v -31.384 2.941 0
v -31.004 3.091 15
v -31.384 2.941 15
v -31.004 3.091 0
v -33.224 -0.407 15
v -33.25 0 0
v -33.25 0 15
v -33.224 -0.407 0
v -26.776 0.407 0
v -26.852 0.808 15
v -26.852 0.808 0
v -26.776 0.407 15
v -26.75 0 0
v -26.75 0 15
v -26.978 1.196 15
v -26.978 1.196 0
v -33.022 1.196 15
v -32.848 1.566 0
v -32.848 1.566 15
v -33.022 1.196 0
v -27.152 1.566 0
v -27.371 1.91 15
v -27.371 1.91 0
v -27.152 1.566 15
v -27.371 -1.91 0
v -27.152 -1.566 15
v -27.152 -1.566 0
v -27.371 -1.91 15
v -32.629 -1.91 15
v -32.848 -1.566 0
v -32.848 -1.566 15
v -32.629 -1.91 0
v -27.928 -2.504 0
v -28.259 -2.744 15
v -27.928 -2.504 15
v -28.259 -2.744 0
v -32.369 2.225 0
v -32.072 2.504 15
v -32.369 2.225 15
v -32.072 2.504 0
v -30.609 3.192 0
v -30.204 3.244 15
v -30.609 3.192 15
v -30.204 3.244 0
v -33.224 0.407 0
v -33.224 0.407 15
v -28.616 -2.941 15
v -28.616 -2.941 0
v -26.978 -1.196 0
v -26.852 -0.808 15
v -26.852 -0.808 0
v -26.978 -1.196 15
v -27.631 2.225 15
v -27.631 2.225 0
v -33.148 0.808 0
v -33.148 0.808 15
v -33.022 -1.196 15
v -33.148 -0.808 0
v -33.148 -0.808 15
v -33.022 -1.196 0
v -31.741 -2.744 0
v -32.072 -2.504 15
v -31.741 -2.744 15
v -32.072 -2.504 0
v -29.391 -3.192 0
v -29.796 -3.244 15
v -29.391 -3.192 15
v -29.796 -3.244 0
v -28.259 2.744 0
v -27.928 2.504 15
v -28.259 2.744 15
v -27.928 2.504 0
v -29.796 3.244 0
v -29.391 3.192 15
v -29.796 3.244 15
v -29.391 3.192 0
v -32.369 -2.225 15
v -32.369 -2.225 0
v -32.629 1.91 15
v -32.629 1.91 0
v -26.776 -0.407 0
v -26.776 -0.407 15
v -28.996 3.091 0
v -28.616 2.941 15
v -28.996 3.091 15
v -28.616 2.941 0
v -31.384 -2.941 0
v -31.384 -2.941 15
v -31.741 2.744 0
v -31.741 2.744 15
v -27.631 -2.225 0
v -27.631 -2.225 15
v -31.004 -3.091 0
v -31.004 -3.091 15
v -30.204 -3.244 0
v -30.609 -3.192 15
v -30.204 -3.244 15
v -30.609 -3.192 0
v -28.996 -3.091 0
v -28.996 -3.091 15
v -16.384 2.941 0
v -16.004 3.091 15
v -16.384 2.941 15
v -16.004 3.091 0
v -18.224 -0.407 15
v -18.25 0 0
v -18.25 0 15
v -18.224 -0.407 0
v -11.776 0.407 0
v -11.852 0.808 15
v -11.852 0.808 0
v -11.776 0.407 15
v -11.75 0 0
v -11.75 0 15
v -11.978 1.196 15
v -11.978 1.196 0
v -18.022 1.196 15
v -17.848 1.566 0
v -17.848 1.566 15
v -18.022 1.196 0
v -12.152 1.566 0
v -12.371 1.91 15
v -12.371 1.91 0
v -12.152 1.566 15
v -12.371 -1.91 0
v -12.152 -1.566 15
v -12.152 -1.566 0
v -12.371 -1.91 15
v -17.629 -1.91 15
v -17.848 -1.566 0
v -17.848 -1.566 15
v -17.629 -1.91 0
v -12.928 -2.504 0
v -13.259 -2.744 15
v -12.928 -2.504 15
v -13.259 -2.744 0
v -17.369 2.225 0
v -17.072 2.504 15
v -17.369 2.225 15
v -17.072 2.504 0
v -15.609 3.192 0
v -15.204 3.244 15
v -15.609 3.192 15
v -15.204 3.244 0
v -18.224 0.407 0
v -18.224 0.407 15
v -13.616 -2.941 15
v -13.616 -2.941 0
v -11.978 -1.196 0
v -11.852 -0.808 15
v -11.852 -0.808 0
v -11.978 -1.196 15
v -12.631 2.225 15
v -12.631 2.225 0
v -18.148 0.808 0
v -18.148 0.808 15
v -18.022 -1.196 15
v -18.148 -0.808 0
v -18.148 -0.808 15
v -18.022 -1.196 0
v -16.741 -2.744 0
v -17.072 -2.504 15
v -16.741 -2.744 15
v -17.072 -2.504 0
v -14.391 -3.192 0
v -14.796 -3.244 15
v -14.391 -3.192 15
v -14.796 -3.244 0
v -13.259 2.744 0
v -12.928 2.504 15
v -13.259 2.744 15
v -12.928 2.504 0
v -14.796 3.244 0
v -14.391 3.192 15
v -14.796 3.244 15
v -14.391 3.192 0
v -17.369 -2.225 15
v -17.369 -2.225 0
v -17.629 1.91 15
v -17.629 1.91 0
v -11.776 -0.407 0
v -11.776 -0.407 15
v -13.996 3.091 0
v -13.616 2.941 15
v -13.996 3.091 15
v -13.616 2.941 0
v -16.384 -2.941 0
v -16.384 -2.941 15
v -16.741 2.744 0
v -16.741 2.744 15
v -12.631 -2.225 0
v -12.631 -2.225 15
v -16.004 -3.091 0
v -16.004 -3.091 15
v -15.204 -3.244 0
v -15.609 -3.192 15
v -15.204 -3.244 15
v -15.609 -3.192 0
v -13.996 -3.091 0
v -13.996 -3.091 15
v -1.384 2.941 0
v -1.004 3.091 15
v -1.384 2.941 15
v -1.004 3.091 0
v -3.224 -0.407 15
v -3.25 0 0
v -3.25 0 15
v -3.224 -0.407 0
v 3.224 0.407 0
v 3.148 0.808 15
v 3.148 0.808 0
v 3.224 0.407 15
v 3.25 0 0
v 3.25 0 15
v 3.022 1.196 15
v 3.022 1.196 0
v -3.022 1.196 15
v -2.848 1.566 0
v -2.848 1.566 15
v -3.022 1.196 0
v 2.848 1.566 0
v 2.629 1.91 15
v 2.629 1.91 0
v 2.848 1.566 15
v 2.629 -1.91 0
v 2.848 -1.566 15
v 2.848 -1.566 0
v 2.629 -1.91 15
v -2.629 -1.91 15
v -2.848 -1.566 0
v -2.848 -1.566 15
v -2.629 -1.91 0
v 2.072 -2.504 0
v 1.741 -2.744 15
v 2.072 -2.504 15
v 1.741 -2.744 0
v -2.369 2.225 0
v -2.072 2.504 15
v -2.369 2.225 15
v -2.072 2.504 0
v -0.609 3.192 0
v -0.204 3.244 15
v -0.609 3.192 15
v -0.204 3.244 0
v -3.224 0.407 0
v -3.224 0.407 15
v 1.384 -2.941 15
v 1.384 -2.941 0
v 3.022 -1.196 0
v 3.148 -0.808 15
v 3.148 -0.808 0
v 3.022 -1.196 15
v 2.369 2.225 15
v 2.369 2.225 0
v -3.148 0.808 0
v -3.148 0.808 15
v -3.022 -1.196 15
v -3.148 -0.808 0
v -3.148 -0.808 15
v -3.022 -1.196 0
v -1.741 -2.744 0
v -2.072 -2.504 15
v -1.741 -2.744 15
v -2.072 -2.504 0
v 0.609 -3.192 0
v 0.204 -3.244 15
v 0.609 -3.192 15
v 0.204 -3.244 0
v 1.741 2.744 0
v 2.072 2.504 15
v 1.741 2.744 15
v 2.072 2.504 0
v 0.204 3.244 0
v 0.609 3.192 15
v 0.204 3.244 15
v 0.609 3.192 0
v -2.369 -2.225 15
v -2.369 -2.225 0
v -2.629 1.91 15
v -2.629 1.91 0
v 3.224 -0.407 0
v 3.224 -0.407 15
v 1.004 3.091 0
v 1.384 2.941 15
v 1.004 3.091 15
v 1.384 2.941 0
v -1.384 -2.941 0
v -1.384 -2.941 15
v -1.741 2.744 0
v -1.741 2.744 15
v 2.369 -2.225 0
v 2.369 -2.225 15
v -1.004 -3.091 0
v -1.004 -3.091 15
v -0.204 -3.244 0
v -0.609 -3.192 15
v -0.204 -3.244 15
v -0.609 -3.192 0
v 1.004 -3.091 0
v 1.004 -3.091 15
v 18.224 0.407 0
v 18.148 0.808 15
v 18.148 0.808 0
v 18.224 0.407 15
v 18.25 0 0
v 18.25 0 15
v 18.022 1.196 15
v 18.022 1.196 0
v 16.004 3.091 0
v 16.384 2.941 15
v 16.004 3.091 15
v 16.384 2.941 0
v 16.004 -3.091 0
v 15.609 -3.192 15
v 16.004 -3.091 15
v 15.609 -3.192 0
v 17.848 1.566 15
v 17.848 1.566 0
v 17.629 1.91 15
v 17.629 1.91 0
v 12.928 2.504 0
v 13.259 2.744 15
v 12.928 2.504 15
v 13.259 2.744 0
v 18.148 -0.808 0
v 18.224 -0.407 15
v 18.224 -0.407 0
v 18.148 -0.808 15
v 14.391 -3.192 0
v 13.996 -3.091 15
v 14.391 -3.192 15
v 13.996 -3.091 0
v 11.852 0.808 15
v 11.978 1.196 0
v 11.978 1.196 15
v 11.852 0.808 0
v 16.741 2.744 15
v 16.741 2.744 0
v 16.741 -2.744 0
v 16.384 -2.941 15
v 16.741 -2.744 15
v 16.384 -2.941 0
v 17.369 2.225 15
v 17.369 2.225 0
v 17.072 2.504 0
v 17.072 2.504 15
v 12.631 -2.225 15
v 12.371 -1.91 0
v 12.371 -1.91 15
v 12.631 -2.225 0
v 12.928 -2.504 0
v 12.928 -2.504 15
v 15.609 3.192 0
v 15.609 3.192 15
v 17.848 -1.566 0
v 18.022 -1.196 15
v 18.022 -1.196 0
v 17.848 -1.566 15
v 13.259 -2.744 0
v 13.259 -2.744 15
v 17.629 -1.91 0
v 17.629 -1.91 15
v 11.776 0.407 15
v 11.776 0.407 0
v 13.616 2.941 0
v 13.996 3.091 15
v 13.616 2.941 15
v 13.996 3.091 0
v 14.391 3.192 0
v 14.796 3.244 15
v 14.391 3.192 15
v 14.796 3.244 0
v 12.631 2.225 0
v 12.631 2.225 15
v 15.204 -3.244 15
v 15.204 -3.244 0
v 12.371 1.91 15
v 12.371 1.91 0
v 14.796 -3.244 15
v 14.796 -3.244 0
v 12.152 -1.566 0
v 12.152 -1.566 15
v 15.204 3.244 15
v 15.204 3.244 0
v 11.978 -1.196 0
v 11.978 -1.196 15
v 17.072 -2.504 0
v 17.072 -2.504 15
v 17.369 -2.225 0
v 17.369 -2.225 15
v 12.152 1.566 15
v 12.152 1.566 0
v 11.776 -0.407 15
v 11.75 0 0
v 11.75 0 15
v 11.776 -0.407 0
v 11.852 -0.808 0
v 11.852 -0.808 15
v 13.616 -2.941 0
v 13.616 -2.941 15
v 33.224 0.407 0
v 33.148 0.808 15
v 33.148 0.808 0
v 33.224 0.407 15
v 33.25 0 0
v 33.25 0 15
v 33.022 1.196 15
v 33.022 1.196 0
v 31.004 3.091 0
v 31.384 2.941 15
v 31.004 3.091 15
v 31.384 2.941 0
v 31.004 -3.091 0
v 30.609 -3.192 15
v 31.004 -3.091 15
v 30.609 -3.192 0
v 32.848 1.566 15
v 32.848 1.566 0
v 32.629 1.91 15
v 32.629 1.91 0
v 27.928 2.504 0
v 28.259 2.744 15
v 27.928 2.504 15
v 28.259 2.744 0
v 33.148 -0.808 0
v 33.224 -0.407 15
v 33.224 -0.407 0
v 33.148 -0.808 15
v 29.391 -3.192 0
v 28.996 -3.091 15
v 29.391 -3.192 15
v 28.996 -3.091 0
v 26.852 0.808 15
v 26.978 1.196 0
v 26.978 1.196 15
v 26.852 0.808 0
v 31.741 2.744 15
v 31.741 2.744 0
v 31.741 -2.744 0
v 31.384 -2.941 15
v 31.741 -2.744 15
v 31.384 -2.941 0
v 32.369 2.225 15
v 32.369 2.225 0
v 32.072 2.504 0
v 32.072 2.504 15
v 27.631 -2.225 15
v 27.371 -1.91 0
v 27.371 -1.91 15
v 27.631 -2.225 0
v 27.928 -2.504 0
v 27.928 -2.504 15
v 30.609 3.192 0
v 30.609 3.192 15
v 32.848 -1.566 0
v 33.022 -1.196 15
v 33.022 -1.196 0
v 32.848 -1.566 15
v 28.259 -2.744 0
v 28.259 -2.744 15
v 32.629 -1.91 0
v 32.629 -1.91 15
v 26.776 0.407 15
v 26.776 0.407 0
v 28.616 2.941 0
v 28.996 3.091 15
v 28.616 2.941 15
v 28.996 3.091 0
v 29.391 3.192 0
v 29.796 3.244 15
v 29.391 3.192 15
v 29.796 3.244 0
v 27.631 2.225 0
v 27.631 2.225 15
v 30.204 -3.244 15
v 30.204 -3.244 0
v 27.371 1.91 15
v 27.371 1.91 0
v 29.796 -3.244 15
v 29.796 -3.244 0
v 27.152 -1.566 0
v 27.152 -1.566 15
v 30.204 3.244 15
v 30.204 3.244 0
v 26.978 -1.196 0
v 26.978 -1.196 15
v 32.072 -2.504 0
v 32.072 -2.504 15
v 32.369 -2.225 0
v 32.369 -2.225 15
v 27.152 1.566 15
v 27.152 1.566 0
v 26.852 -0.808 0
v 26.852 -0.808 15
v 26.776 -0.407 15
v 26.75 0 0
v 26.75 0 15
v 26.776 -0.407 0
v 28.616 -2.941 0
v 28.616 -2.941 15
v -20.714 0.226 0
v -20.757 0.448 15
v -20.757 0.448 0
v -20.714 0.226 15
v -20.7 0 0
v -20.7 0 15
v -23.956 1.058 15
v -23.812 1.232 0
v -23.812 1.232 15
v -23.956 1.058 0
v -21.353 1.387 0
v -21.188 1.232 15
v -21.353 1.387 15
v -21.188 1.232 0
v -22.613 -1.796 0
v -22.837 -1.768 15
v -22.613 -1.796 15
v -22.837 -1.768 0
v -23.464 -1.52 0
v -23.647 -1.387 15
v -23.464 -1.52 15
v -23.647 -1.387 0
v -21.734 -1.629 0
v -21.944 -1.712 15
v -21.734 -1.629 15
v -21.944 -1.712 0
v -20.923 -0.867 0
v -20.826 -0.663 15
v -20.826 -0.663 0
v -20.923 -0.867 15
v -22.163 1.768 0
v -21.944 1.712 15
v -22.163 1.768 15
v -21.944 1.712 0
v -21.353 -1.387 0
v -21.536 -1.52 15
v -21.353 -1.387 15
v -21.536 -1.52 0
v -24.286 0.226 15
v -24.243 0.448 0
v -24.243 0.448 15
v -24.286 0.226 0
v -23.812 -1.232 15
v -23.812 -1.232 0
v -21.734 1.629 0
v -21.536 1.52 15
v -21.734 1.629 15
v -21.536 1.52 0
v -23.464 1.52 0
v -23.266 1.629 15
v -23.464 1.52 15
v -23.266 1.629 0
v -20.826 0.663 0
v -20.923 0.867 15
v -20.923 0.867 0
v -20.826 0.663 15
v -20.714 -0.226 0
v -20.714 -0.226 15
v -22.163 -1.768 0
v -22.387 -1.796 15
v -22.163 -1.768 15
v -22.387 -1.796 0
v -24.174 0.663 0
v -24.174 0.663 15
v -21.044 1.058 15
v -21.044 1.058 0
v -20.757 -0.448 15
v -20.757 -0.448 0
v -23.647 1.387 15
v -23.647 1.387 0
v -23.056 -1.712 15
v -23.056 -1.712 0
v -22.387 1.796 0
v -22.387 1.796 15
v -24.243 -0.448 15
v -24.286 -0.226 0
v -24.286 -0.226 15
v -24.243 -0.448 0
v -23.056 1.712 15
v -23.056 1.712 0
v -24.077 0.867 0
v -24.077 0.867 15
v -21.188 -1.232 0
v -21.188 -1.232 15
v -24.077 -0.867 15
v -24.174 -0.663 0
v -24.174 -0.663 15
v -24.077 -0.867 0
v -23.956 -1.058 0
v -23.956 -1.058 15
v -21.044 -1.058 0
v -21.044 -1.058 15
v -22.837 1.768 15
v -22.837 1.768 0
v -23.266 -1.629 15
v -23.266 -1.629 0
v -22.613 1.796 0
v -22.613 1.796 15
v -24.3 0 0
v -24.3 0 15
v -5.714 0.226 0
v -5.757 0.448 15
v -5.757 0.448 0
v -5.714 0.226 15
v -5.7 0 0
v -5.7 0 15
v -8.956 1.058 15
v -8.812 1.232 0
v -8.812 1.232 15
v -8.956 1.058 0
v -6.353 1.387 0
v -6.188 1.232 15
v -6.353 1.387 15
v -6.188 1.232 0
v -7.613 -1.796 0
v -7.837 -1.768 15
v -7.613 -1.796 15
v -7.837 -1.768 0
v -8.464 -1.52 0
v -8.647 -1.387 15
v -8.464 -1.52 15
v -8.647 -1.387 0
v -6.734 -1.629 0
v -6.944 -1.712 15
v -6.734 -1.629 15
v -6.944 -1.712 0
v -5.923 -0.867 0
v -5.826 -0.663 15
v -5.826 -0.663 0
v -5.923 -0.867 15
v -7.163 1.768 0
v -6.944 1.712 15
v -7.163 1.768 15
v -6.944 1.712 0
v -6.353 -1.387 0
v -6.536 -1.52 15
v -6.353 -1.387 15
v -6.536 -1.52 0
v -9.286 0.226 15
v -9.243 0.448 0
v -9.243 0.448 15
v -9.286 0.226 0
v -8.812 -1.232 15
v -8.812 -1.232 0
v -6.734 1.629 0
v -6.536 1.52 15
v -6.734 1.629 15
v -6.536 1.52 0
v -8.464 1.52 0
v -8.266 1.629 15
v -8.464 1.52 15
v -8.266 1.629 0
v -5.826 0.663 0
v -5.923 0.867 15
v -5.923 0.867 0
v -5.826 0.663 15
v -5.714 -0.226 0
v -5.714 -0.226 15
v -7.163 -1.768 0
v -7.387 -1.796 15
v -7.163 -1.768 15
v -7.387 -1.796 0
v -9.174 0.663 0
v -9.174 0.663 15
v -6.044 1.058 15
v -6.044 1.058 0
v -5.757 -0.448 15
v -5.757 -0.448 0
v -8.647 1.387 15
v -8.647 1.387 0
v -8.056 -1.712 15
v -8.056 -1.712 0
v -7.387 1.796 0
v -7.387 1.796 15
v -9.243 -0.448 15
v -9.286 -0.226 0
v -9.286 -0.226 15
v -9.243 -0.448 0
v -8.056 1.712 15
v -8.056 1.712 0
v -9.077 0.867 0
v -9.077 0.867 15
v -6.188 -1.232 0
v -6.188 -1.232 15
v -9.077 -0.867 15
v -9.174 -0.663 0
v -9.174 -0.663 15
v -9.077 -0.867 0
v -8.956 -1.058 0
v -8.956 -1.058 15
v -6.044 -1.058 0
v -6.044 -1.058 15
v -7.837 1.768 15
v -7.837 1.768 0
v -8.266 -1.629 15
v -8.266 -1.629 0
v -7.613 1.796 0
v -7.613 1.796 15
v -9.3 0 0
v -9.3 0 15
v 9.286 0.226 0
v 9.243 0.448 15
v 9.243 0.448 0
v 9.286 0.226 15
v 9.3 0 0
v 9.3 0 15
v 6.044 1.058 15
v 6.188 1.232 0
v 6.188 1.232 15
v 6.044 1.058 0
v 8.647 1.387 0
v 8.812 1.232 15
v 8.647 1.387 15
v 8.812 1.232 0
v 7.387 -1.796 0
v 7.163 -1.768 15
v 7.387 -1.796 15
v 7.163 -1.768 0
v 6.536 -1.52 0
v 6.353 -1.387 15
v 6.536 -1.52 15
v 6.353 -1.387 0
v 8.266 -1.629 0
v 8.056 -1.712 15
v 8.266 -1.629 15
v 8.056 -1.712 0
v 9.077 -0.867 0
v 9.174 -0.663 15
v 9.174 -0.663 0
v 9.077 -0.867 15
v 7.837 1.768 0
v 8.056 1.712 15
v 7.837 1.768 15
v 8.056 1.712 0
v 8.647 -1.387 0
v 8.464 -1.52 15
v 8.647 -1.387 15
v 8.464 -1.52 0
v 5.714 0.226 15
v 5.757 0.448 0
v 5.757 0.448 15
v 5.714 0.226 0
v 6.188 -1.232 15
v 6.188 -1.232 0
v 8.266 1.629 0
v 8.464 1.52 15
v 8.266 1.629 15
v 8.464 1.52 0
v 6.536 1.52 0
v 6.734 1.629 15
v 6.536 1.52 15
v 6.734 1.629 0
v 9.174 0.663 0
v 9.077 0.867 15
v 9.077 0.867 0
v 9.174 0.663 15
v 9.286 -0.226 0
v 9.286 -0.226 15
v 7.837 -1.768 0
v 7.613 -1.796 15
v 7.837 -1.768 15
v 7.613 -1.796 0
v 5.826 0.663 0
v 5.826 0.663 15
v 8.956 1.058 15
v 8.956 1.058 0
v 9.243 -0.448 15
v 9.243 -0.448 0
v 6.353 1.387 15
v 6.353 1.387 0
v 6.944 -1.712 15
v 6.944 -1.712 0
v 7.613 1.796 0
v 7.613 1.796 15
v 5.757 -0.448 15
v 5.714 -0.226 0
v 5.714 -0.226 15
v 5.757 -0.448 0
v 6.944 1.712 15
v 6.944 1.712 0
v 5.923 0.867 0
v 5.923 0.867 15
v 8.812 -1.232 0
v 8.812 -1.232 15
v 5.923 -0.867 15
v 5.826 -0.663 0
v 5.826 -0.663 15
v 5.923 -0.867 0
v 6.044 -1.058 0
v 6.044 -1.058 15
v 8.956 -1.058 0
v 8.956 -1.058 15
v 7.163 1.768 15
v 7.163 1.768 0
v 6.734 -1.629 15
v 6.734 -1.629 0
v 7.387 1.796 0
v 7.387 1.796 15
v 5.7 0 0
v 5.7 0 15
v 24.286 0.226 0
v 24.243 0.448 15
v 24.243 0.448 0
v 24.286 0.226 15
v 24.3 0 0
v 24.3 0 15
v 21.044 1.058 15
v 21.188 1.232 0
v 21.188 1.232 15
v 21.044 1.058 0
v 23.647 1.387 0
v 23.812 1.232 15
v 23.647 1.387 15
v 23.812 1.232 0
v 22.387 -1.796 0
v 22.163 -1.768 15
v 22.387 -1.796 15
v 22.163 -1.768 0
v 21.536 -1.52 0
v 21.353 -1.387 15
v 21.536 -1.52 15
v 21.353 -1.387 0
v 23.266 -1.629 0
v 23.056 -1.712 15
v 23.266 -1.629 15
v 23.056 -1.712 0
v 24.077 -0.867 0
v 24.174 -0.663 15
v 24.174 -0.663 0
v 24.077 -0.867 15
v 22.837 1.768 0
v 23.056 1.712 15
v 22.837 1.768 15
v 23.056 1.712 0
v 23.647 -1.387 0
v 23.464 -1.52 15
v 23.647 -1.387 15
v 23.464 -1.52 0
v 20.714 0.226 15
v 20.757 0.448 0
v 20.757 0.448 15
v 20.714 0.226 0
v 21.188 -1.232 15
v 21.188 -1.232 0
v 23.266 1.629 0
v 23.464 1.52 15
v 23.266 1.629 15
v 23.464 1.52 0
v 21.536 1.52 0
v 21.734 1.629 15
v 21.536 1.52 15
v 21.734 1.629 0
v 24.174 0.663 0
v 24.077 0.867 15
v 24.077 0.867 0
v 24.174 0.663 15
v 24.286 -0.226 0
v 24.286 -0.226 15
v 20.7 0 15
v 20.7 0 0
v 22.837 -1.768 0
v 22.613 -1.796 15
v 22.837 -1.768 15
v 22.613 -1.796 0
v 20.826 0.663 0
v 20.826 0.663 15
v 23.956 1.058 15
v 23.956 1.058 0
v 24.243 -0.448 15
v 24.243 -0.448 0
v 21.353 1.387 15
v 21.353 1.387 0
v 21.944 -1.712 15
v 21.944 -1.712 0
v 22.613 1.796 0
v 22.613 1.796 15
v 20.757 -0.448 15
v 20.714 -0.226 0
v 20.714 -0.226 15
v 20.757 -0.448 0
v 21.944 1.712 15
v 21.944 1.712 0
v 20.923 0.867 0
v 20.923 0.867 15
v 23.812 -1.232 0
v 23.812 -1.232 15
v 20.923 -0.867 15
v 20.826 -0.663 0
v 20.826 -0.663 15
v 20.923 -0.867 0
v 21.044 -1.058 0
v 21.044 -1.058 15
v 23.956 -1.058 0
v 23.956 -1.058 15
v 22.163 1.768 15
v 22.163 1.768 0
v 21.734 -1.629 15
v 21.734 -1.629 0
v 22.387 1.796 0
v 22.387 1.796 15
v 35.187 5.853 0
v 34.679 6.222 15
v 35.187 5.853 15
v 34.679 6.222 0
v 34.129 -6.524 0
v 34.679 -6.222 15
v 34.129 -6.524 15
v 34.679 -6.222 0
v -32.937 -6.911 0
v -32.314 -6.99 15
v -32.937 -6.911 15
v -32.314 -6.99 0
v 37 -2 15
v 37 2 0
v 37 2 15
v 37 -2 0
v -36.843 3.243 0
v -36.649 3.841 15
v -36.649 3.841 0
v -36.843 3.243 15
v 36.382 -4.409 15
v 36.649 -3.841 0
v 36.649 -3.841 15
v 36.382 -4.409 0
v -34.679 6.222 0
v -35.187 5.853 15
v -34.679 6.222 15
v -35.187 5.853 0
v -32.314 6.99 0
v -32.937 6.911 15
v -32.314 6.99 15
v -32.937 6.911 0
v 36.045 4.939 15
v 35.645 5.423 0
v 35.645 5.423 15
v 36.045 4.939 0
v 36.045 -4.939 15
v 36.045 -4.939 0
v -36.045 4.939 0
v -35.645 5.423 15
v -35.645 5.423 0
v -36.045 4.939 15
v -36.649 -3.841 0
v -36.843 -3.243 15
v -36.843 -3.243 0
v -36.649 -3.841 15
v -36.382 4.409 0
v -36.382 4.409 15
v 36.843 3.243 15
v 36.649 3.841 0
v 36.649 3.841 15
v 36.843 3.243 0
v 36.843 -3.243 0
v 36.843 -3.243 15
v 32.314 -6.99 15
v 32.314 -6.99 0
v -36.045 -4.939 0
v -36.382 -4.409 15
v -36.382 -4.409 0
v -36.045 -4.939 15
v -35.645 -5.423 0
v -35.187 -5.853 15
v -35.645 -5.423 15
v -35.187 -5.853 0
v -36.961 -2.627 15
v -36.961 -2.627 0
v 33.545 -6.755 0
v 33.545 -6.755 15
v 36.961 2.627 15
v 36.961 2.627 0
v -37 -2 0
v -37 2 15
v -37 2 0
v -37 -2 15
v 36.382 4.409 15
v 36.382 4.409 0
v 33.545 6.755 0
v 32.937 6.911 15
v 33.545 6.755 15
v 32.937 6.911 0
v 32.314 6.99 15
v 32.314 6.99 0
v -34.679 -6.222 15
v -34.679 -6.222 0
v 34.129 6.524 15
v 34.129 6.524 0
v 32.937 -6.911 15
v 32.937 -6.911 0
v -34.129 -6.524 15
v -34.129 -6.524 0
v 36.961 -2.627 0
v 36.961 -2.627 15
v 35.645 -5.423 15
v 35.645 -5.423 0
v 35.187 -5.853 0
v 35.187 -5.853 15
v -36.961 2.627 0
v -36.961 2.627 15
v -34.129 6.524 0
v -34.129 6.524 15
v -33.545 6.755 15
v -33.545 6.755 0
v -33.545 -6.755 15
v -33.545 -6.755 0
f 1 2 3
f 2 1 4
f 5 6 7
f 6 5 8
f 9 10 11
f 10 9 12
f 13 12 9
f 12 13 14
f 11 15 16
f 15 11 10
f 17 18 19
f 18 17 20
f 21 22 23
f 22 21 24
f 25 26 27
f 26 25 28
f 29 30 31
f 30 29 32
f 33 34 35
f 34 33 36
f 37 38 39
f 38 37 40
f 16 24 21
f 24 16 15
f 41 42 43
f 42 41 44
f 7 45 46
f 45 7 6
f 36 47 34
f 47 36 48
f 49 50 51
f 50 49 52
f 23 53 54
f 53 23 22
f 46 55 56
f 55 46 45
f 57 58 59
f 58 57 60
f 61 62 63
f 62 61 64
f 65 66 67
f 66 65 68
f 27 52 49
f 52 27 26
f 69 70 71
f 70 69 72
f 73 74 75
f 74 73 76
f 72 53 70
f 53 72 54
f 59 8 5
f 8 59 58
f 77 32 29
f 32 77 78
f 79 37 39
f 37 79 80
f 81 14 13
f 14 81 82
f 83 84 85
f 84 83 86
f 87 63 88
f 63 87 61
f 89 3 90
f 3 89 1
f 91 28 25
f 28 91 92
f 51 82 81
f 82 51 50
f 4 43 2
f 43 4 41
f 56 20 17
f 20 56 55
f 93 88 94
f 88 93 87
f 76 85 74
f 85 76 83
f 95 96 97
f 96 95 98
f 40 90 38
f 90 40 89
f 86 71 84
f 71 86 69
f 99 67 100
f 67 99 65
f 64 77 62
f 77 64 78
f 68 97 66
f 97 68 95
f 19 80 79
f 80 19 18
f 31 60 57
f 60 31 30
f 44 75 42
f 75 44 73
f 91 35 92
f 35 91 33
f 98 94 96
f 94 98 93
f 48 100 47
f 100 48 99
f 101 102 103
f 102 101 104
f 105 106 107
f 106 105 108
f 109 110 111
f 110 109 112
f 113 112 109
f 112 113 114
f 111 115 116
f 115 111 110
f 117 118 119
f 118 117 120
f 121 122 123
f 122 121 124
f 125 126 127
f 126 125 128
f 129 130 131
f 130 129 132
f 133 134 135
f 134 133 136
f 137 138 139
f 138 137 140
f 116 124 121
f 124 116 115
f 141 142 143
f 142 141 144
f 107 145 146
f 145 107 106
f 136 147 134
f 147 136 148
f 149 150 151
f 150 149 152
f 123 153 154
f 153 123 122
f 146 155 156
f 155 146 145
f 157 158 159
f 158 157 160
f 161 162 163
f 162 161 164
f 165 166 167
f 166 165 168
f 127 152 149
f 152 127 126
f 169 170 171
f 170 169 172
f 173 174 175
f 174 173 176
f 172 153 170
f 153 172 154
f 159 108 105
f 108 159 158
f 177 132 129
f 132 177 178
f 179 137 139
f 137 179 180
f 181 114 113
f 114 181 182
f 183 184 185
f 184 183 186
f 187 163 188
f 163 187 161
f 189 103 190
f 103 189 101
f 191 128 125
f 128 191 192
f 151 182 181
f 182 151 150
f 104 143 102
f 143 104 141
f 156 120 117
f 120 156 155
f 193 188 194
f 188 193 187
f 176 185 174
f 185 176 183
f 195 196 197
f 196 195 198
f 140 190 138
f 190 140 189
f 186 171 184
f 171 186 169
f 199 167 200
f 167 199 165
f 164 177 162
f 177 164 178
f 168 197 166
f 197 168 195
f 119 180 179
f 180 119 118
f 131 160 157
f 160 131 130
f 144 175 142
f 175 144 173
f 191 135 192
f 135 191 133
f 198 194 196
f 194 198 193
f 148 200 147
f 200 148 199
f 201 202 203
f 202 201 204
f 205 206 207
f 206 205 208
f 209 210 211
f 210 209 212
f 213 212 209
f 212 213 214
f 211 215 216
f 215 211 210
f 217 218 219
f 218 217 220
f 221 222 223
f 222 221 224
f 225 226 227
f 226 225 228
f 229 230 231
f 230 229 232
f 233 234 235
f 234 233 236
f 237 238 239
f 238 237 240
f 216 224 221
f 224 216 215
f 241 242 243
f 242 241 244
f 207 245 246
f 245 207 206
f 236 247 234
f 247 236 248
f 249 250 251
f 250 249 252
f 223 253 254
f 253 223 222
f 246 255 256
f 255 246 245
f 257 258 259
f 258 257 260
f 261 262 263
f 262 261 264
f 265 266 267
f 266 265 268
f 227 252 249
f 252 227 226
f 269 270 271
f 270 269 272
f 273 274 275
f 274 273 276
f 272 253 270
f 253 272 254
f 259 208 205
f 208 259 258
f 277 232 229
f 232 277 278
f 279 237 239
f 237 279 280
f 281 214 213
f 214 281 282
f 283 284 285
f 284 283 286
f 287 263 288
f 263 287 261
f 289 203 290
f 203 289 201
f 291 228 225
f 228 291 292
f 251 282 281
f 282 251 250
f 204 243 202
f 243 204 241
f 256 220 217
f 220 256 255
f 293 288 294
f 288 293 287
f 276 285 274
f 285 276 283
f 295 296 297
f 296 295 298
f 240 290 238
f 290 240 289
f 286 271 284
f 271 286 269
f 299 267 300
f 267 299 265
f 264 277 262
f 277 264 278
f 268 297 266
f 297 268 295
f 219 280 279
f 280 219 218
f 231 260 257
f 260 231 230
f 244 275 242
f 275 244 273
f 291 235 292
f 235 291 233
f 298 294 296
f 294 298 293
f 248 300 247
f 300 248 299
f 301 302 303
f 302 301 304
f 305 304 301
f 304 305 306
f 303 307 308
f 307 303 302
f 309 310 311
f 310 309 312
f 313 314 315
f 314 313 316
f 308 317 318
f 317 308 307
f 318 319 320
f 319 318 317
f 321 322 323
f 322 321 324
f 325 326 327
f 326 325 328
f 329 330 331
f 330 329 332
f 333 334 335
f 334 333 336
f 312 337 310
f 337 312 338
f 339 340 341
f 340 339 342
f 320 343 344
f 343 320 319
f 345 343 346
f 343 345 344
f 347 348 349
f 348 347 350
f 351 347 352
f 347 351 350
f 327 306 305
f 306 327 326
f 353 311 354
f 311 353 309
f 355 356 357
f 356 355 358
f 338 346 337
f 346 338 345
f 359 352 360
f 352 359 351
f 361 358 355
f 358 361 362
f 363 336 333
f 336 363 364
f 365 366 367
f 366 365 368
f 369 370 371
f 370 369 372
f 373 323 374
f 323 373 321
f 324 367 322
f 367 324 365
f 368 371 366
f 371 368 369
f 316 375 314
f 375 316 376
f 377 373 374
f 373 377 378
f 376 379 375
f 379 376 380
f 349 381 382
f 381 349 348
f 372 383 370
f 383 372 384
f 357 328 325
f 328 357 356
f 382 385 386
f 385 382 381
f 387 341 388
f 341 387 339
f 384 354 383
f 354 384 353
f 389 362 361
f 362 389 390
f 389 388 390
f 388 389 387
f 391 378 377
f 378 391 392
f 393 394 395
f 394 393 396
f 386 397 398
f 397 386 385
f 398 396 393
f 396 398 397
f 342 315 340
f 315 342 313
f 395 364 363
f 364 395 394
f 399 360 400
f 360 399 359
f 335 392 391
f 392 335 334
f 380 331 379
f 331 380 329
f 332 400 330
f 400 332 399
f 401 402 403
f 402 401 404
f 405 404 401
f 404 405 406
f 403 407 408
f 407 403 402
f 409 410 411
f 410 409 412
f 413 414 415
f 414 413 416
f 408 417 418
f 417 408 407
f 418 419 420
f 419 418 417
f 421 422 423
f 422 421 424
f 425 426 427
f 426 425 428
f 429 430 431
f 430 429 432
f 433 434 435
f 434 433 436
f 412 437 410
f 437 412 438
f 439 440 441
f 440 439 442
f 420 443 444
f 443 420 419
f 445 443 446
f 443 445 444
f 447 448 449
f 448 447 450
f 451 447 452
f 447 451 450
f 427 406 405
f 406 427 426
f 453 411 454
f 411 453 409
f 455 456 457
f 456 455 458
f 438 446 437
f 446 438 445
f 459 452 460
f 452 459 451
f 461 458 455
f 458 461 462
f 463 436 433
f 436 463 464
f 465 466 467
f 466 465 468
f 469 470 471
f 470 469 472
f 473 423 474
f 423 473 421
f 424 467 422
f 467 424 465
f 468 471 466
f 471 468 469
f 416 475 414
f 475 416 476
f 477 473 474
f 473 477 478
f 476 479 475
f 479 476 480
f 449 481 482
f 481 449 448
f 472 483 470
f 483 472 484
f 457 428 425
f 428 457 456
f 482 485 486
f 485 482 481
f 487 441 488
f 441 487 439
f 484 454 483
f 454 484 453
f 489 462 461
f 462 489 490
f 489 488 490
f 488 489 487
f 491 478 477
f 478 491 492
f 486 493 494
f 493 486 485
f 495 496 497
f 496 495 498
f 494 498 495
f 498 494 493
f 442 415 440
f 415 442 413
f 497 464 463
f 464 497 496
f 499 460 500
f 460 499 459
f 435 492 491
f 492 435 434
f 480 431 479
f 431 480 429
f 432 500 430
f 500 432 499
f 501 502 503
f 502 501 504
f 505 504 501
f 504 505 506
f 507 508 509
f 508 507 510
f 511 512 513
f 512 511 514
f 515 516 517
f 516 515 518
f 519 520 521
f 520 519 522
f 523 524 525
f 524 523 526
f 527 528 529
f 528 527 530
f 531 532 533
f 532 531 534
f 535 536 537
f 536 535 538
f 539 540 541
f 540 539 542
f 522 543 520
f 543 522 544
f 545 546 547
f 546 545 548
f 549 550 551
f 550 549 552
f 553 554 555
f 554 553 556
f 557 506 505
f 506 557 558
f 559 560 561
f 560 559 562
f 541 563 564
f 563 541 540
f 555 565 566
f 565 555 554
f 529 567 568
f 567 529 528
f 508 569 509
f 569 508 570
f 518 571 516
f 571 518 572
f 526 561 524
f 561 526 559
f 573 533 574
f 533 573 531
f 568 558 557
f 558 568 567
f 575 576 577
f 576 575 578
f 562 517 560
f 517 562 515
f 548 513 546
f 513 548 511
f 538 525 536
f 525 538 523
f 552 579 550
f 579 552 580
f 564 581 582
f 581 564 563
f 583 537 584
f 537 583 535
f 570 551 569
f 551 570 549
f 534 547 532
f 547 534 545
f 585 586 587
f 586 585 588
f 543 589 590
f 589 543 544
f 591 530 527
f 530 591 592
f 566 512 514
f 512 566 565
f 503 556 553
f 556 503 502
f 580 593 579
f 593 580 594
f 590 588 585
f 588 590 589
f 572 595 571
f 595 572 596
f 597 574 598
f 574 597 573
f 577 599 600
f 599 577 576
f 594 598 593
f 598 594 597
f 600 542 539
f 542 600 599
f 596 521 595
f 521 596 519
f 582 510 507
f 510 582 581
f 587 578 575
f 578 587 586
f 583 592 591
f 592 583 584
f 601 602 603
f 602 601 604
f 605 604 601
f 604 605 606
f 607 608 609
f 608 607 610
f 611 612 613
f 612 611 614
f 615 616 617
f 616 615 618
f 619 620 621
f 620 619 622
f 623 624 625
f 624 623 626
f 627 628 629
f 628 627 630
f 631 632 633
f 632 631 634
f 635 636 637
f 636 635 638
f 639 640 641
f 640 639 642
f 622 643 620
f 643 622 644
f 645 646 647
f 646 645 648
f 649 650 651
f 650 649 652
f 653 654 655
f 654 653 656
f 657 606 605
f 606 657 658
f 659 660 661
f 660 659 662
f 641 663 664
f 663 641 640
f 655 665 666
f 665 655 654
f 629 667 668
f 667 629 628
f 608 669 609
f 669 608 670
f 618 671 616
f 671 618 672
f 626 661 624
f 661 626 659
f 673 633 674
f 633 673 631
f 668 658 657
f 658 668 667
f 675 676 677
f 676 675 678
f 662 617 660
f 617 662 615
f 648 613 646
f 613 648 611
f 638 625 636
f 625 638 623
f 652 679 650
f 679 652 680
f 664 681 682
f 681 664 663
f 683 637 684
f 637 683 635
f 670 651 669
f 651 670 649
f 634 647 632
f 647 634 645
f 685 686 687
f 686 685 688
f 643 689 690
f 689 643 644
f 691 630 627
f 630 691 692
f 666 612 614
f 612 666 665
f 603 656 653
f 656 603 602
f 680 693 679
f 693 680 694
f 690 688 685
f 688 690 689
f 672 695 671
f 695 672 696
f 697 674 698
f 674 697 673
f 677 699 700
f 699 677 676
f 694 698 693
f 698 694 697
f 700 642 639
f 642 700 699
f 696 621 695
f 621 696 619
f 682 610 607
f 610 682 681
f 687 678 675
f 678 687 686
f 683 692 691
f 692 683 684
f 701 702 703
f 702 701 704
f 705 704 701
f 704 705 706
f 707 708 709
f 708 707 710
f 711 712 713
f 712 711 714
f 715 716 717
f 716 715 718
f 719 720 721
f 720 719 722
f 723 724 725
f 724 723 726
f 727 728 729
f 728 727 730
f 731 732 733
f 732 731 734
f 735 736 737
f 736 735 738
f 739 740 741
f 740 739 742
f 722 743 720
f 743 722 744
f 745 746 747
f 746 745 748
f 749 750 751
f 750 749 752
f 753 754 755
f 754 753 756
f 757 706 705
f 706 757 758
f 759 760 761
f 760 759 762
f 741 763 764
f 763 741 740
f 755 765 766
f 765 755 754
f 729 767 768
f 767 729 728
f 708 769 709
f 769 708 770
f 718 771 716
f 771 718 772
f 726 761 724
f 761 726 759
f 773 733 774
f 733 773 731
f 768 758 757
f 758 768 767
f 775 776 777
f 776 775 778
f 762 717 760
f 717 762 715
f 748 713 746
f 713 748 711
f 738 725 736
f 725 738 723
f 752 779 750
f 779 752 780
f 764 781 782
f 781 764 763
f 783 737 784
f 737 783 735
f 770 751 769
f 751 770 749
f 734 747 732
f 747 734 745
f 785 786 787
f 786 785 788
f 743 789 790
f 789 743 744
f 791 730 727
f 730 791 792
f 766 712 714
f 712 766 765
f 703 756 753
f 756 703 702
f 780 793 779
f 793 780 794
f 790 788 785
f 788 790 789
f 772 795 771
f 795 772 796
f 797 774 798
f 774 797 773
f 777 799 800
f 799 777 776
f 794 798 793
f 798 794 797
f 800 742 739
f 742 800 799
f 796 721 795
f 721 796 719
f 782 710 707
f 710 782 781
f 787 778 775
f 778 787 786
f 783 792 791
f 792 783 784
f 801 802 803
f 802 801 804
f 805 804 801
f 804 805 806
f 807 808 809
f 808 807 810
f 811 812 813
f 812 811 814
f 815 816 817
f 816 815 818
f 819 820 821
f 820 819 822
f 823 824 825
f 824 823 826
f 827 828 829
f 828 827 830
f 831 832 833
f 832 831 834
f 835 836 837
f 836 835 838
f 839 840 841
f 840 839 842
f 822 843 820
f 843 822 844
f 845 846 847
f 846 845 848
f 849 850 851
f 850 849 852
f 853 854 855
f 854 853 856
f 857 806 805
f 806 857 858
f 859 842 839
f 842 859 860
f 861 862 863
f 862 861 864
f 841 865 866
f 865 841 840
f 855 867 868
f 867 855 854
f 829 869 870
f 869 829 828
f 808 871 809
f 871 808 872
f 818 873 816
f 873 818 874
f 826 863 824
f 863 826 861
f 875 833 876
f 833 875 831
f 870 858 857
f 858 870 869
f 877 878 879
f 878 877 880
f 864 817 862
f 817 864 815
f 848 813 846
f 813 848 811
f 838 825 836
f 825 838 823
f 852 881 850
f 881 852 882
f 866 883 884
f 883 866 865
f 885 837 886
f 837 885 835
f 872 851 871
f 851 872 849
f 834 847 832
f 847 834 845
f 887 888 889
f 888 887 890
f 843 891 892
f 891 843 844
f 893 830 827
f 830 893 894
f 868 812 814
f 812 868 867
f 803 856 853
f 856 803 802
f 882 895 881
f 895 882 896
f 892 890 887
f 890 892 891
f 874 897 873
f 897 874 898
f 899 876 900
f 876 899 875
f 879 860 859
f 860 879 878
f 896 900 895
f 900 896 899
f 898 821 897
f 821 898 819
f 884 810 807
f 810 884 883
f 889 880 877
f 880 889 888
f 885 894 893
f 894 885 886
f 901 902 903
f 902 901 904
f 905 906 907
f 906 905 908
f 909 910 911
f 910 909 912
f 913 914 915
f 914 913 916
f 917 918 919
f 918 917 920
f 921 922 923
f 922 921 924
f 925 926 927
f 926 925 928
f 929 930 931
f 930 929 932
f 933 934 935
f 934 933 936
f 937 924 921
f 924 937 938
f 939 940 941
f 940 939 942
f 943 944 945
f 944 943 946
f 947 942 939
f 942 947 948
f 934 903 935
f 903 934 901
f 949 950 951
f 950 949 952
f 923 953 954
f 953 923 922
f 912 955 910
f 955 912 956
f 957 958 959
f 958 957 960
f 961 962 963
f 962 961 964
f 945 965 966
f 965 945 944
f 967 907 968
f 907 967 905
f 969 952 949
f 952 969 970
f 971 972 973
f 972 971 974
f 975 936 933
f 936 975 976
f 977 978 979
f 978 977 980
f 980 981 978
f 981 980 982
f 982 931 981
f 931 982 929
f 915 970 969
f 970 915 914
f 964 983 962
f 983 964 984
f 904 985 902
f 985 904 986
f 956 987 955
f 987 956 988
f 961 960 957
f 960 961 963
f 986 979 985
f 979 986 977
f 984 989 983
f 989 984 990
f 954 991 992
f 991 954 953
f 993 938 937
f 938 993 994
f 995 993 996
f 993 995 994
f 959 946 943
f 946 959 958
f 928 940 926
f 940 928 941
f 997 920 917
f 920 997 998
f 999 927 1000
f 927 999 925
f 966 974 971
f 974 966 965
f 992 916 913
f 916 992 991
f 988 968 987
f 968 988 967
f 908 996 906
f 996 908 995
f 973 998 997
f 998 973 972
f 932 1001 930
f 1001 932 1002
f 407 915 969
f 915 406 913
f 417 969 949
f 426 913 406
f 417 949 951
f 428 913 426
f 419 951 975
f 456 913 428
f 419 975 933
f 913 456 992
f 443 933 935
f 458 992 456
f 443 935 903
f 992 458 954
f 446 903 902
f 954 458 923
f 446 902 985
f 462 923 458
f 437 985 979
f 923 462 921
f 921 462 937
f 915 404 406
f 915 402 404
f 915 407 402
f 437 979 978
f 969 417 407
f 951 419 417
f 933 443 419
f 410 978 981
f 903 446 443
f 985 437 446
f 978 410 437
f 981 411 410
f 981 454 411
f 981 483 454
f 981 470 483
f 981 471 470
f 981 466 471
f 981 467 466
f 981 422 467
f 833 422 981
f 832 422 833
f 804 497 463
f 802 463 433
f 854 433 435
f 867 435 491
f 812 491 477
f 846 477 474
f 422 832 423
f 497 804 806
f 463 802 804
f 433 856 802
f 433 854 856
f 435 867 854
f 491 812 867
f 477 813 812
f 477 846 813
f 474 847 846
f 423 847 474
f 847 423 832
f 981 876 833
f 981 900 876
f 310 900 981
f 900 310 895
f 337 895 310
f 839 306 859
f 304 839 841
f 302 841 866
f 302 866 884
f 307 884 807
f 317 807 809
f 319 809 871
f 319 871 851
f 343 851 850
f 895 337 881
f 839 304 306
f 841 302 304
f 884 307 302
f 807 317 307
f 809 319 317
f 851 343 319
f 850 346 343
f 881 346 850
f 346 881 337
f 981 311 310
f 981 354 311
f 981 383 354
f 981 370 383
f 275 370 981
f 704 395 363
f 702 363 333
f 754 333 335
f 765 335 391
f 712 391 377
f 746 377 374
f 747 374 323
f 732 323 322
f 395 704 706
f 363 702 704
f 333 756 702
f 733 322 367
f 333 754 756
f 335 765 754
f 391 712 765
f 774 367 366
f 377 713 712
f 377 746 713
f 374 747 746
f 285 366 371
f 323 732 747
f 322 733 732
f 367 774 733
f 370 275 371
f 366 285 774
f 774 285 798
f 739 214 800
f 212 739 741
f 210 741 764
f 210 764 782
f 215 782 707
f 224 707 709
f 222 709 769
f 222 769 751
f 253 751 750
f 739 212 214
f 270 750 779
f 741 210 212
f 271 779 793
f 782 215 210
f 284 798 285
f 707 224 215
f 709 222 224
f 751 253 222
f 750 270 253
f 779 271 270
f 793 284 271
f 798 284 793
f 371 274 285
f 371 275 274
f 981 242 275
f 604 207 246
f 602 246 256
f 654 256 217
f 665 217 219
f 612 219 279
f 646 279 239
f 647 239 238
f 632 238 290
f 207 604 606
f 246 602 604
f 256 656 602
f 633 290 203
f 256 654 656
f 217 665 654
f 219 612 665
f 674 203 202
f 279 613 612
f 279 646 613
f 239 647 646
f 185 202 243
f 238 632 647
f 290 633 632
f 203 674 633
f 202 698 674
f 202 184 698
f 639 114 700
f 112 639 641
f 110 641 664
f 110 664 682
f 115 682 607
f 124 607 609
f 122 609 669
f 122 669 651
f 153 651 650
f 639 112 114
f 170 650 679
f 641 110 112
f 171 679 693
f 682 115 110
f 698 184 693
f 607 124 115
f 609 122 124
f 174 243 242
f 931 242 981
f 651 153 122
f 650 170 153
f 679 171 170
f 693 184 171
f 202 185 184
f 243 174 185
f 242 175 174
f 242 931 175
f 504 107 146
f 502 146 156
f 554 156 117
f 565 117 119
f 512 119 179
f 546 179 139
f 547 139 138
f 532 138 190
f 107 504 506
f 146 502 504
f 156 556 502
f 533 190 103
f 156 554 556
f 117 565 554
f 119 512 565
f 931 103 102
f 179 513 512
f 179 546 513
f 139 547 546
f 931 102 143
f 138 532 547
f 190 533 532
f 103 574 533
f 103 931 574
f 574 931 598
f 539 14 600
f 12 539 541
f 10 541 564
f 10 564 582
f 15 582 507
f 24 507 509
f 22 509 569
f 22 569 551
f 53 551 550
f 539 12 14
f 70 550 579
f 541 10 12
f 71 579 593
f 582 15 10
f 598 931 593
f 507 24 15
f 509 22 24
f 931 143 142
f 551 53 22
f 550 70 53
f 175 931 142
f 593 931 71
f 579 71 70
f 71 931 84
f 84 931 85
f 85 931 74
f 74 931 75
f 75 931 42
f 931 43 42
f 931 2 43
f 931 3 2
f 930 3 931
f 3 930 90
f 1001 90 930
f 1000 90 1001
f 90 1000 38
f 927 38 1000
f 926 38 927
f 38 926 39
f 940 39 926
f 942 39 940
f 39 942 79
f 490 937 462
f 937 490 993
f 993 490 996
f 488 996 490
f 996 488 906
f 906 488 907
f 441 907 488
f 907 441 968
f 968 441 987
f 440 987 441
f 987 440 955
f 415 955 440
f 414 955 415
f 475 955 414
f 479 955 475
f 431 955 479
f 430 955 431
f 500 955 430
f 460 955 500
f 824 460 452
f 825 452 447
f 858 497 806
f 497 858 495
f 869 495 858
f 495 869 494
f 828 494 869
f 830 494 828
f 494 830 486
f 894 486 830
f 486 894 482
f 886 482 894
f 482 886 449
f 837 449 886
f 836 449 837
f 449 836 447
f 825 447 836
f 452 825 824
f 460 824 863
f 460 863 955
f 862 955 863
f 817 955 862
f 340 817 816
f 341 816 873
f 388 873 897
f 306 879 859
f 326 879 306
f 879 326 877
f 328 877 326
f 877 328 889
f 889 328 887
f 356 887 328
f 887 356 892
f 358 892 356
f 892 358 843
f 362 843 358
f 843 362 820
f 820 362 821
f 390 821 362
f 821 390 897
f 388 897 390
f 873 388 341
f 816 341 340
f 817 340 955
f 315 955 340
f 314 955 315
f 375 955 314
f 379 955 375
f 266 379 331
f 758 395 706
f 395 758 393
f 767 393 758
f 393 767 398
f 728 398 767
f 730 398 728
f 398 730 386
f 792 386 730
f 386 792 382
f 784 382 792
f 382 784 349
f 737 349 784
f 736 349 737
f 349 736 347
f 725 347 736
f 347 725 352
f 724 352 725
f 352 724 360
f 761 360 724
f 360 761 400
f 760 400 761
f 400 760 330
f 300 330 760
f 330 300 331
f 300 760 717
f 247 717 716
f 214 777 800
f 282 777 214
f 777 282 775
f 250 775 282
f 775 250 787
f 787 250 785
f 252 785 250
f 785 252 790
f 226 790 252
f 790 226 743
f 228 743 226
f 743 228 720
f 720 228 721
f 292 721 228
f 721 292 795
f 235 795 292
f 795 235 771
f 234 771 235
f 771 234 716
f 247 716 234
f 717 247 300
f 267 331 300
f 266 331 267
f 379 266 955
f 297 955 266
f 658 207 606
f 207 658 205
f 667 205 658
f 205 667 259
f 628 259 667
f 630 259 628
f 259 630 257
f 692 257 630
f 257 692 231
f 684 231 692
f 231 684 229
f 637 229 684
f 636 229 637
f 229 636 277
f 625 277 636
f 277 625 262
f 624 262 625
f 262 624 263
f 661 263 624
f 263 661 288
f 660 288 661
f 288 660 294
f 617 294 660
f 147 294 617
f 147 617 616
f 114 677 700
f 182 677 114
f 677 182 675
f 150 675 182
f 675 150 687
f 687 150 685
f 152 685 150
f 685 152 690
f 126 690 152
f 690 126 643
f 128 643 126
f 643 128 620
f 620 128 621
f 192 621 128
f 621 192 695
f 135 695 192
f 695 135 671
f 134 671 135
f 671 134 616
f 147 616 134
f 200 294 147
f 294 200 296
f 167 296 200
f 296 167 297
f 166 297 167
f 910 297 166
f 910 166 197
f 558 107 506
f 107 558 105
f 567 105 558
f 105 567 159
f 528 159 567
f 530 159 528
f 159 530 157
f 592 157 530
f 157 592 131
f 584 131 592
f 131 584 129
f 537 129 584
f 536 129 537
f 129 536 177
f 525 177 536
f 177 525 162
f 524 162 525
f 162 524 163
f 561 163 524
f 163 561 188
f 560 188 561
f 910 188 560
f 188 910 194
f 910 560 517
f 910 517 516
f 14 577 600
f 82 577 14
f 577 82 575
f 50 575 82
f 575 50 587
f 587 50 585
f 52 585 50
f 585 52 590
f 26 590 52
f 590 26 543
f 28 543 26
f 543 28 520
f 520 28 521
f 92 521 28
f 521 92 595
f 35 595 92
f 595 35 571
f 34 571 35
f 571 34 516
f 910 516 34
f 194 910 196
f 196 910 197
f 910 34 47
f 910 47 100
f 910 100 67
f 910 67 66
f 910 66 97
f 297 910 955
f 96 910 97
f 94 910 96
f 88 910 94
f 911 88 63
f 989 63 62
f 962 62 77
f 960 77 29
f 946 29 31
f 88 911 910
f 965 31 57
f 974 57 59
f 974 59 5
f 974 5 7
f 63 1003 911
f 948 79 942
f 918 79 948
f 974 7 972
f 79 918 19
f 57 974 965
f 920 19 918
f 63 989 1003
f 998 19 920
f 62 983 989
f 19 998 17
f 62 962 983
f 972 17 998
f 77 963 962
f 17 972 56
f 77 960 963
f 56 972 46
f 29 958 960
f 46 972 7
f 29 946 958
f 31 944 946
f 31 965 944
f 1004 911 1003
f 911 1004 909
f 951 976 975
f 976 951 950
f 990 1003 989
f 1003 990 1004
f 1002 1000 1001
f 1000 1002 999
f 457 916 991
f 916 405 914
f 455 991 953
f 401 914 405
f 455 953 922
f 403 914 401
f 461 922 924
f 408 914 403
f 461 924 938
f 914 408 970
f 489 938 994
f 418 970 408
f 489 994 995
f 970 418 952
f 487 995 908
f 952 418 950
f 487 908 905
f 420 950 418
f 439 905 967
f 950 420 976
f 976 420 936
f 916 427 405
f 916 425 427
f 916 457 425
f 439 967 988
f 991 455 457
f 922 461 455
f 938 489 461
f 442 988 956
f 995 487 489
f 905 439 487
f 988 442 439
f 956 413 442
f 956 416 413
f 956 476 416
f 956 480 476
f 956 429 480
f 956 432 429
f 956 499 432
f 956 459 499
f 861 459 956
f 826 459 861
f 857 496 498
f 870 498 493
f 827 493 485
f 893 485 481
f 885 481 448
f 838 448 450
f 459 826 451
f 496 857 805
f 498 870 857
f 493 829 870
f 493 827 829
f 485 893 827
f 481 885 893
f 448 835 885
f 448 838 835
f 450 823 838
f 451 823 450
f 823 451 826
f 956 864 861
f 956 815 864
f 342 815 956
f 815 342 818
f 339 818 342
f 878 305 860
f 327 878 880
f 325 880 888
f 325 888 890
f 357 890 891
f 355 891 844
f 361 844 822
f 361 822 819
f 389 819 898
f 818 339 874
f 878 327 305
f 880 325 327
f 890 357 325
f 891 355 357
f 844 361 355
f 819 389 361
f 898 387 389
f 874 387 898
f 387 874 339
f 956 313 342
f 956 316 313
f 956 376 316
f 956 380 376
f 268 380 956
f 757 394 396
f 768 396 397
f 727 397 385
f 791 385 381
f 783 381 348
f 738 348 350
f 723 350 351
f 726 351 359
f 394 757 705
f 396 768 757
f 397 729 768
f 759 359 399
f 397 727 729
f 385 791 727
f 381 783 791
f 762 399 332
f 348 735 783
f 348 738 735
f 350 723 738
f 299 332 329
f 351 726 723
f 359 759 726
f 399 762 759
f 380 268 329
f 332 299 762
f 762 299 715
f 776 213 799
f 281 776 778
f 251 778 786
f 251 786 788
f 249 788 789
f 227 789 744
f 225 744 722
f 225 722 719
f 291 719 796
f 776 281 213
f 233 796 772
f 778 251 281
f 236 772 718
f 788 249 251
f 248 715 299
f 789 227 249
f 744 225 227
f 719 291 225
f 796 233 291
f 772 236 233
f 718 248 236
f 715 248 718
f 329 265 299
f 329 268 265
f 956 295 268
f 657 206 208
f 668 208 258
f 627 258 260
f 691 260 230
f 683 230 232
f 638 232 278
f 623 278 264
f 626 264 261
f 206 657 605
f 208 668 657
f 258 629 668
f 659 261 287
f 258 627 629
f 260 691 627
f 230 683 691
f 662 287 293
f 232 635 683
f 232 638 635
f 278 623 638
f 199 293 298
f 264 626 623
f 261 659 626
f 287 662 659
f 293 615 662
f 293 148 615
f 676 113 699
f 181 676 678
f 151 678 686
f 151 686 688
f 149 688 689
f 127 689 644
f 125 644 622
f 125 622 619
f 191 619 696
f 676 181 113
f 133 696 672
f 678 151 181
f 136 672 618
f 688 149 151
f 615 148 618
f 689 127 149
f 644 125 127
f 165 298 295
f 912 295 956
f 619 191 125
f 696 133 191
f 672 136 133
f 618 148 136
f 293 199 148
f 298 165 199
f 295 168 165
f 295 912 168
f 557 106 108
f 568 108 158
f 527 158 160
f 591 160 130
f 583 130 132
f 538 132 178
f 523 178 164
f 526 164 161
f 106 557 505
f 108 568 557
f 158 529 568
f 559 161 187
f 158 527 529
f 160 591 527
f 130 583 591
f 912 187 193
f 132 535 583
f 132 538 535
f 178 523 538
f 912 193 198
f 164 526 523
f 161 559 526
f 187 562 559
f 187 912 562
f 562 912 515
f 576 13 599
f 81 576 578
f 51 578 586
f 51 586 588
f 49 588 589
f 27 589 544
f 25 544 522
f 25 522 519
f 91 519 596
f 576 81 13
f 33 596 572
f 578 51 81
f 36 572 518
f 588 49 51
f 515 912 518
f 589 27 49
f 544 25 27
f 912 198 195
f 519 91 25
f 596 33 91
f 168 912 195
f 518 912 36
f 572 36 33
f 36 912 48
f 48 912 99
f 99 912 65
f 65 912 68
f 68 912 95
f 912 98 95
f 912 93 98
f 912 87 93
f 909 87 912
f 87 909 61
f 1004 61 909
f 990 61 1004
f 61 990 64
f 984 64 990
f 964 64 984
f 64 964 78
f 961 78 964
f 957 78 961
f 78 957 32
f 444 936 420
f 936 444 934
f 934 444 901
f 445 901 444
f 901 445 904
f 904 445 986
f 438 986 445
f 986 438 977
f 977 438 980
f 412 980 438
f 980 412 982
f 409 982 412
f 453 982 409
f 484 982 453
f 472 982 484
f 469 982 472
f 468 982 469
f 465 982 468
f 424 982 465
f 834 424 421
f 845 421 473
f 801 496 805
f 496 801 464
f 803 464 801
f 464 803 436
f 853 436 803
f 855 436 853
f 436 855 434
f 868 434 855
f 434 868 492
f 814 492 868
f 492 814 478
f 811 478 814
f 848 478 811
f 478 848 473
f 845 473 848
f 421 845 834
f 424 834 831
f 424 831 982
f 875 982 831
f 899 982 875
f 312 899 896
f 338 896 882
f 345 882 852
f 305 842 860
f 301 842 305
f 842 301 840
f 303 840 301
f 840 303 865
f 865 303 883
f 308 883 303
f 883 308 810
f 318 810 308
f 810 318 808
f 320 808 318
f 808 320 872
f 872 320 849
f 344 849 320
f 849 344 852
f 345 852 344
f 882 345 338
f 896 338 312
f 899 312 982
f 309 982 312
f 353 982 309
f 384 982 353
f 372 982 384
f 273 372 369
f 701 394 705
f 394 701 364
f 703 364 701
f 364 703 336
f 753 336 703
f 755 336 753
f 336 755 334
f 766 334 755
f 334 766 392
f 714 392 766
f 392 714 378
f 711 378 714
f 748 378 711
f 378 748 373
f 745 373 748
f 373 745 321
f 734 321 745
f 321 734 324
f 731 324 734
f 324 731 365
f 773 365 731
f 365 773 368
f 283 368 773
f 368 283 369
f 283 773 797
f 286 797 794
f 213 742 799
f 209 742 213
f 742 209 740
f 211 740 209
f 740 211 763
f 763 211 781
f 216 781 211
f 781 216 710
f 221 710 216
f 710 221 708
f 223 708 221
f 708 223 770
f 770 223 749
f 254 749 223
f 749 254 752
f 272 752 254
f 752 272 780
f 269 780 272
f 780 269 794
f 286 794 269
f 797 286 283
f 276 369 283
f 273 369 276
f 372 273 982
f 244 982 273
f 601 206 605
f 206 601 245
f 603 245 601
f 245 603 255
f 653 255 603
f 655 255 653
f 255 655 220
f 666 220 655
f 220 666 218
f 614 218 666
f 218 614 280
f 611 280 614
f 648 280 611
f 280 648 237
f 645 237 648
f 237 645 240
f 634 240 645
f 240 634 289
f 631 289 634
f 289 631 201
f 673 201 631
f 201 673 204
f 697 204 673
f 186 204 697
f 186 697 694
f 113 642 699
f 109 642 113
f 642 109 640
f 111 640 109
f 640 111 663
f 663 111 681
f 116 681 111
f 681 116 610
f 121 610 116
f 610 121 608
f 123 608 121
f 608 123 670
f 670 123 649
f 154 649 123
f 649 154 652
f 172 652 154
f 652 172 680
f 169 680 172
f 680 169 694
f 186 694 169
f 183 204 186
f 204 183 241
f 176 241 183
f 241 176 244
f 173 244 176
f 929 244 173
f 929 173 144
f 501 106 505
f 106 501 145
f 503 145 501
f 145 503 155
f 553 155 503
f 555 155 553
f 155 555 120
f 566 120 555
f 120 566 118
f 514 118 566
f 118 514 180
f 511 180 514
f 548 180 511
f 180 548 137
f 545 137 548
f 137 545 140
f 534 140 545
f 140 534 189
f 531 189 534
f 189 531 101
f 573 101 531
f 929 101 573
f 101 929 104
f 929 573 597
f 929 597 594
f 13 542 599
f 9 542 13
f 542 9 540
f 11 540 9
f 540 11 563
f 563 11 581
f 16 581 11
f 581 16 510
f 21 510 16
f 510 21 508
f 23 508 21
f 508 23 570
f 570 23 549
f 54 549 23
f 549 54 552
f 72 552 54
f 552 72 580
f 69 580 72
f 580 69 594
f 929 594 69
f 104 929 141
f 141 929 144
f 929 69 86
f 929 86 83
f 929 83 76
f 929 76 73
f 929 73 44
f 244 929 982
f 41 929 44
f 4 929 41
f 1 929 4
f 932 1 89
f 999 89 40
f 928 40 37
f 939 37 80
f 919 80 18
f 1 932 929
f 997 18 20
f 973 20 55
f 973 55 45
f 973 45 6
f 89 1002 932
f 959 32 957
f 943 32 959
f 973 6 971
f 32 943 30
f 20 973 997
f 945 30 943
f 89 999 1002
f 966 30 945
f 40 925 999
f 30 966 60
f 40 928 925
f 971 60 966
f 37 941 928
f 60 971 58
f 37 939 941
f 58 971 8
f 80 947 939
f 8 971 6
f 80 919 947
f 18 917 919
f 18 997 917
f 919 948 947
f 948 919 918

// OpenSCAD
$fn = 50;


difference() {
	union() {
		*color(alpha = 1.0000000000, c = "gray") {
			translate(v = [0, 7, 0]) {
				linear_extrude(height = 1) {
					text(font = "Arial:style=Bold", halign = "center", size = 4.5000000000, text = "COMMENT plate main", valign = "center");
				}
			}
		}
		hull() {
			translate(v = [-32.0000000000, 2.0000000000, 0]) {
				cylinder(h = 15, r = 5);
			}
			translate(v = [32.0000000000, 2.0000000000, 0]) {
				cylinder(h = 15, r = 5);
			}
			translate(v = [-32.0000000000, -2.0000000000, 0]) {
				cylinder(h = 15, r = 5);
			}
			translate(v = [32.0000000000, -2.0000000000, 0]) {
				cylinder(h = 15, r = 5);
			}
		}
	}
	union() {
		*color(alpha = 1.0000000000, c = "gray") {
			translate(v = [0, 7, 0]) {
				linear_extrude(height = 1) {
					text(font = "Arial:style=Bold", halign = "center", size = 4.5000000000, text = "COMMENT holes main", valign = "center");
				}
			}
		}
		translate(v = [-30.0000000000, 0.0000000000, 0]) {
			translate(v = [0, 0, -100]) {
				cylinder(h = 200, r = 3.2500000000);
			}
		}
		translate(v = [-15.0000000000, 0.0000000000, 0]) {
			translate(v = [0, 0, -100]) {
				cylinder(h = 200, r = 3.2500000000);
			}
		}
		translate(v = [0, 0, -100]) {
			cylinder(h = 200, r = 3.2500000000);
		}
		translate(v = [15.0000000000, 0.0000000000, 0]) {
			translate(v = [0, 0, -100]) {
				cylinder(h = 200, r = 3.2500000000);
			}
		}
		translate(v = [30.0000000000, 0.0000000000, 0]) {
			translate(v = [0, 0, -100]) {
				cylinder(h = 200, r = 3.2500000000);
			}
		}
		translate(v = [-30.0000000000, 0.0000000000, 0]) {
			translate(v = [0, 0, -100]) {
				cylinder(h = 200, r = 1.8000000000);
			}
		}
		translate(v = [-22.5000000000, 0.0000000000, 0]) {
			translate(v = [0, 0, -100]) {
				cylinder(h = 200, r = 1.8000000000);
			}
		}
		translate(v = [-15.0000000000, 0.0000000000, 0]) {
			translate(v = [0, 0, -100]) {
				cylinder(h = 200, r = 1.8000000000);
			}
		}
		translate(v = [-7.5000000000, 0.0000000000, 0]) {
			translate(v = [0, 0, -100]) {
				cylinder(h = 200, r = 1.8000000000);
			}
		}
		translate(v = [0, 0, -100]) {
			cylinder(h = 200, r = 1.8000000000);
		}
		translate(v = [7.5000000000, 0.0000000000, 0]) {
			translate(v = [0, 0, -100]) {
				cylinder(h = 200, r = 1.8000000000);
			}
		}
		translate(v = [15.0000000000, 0.0000000000, 0]) {
			translate(v = [0, 0, -100]) {
				cylinder(h = 200, r = 1.8000000000);
			}
		}
		translate(v = [22.5000000000, 0.0000000000, 0]) {
			translate(v = [0, 0, -100]) {
				cylinder(h = 200, r = 1.8000000000);
			}
		}
		translate(v = [30.0000000000, 0.0000000000, 0]) {
			translate(v = [0, 0, -100]) {
				cylinder(h = 200, r = 1.8000000000);
			}
		}
	}
}
